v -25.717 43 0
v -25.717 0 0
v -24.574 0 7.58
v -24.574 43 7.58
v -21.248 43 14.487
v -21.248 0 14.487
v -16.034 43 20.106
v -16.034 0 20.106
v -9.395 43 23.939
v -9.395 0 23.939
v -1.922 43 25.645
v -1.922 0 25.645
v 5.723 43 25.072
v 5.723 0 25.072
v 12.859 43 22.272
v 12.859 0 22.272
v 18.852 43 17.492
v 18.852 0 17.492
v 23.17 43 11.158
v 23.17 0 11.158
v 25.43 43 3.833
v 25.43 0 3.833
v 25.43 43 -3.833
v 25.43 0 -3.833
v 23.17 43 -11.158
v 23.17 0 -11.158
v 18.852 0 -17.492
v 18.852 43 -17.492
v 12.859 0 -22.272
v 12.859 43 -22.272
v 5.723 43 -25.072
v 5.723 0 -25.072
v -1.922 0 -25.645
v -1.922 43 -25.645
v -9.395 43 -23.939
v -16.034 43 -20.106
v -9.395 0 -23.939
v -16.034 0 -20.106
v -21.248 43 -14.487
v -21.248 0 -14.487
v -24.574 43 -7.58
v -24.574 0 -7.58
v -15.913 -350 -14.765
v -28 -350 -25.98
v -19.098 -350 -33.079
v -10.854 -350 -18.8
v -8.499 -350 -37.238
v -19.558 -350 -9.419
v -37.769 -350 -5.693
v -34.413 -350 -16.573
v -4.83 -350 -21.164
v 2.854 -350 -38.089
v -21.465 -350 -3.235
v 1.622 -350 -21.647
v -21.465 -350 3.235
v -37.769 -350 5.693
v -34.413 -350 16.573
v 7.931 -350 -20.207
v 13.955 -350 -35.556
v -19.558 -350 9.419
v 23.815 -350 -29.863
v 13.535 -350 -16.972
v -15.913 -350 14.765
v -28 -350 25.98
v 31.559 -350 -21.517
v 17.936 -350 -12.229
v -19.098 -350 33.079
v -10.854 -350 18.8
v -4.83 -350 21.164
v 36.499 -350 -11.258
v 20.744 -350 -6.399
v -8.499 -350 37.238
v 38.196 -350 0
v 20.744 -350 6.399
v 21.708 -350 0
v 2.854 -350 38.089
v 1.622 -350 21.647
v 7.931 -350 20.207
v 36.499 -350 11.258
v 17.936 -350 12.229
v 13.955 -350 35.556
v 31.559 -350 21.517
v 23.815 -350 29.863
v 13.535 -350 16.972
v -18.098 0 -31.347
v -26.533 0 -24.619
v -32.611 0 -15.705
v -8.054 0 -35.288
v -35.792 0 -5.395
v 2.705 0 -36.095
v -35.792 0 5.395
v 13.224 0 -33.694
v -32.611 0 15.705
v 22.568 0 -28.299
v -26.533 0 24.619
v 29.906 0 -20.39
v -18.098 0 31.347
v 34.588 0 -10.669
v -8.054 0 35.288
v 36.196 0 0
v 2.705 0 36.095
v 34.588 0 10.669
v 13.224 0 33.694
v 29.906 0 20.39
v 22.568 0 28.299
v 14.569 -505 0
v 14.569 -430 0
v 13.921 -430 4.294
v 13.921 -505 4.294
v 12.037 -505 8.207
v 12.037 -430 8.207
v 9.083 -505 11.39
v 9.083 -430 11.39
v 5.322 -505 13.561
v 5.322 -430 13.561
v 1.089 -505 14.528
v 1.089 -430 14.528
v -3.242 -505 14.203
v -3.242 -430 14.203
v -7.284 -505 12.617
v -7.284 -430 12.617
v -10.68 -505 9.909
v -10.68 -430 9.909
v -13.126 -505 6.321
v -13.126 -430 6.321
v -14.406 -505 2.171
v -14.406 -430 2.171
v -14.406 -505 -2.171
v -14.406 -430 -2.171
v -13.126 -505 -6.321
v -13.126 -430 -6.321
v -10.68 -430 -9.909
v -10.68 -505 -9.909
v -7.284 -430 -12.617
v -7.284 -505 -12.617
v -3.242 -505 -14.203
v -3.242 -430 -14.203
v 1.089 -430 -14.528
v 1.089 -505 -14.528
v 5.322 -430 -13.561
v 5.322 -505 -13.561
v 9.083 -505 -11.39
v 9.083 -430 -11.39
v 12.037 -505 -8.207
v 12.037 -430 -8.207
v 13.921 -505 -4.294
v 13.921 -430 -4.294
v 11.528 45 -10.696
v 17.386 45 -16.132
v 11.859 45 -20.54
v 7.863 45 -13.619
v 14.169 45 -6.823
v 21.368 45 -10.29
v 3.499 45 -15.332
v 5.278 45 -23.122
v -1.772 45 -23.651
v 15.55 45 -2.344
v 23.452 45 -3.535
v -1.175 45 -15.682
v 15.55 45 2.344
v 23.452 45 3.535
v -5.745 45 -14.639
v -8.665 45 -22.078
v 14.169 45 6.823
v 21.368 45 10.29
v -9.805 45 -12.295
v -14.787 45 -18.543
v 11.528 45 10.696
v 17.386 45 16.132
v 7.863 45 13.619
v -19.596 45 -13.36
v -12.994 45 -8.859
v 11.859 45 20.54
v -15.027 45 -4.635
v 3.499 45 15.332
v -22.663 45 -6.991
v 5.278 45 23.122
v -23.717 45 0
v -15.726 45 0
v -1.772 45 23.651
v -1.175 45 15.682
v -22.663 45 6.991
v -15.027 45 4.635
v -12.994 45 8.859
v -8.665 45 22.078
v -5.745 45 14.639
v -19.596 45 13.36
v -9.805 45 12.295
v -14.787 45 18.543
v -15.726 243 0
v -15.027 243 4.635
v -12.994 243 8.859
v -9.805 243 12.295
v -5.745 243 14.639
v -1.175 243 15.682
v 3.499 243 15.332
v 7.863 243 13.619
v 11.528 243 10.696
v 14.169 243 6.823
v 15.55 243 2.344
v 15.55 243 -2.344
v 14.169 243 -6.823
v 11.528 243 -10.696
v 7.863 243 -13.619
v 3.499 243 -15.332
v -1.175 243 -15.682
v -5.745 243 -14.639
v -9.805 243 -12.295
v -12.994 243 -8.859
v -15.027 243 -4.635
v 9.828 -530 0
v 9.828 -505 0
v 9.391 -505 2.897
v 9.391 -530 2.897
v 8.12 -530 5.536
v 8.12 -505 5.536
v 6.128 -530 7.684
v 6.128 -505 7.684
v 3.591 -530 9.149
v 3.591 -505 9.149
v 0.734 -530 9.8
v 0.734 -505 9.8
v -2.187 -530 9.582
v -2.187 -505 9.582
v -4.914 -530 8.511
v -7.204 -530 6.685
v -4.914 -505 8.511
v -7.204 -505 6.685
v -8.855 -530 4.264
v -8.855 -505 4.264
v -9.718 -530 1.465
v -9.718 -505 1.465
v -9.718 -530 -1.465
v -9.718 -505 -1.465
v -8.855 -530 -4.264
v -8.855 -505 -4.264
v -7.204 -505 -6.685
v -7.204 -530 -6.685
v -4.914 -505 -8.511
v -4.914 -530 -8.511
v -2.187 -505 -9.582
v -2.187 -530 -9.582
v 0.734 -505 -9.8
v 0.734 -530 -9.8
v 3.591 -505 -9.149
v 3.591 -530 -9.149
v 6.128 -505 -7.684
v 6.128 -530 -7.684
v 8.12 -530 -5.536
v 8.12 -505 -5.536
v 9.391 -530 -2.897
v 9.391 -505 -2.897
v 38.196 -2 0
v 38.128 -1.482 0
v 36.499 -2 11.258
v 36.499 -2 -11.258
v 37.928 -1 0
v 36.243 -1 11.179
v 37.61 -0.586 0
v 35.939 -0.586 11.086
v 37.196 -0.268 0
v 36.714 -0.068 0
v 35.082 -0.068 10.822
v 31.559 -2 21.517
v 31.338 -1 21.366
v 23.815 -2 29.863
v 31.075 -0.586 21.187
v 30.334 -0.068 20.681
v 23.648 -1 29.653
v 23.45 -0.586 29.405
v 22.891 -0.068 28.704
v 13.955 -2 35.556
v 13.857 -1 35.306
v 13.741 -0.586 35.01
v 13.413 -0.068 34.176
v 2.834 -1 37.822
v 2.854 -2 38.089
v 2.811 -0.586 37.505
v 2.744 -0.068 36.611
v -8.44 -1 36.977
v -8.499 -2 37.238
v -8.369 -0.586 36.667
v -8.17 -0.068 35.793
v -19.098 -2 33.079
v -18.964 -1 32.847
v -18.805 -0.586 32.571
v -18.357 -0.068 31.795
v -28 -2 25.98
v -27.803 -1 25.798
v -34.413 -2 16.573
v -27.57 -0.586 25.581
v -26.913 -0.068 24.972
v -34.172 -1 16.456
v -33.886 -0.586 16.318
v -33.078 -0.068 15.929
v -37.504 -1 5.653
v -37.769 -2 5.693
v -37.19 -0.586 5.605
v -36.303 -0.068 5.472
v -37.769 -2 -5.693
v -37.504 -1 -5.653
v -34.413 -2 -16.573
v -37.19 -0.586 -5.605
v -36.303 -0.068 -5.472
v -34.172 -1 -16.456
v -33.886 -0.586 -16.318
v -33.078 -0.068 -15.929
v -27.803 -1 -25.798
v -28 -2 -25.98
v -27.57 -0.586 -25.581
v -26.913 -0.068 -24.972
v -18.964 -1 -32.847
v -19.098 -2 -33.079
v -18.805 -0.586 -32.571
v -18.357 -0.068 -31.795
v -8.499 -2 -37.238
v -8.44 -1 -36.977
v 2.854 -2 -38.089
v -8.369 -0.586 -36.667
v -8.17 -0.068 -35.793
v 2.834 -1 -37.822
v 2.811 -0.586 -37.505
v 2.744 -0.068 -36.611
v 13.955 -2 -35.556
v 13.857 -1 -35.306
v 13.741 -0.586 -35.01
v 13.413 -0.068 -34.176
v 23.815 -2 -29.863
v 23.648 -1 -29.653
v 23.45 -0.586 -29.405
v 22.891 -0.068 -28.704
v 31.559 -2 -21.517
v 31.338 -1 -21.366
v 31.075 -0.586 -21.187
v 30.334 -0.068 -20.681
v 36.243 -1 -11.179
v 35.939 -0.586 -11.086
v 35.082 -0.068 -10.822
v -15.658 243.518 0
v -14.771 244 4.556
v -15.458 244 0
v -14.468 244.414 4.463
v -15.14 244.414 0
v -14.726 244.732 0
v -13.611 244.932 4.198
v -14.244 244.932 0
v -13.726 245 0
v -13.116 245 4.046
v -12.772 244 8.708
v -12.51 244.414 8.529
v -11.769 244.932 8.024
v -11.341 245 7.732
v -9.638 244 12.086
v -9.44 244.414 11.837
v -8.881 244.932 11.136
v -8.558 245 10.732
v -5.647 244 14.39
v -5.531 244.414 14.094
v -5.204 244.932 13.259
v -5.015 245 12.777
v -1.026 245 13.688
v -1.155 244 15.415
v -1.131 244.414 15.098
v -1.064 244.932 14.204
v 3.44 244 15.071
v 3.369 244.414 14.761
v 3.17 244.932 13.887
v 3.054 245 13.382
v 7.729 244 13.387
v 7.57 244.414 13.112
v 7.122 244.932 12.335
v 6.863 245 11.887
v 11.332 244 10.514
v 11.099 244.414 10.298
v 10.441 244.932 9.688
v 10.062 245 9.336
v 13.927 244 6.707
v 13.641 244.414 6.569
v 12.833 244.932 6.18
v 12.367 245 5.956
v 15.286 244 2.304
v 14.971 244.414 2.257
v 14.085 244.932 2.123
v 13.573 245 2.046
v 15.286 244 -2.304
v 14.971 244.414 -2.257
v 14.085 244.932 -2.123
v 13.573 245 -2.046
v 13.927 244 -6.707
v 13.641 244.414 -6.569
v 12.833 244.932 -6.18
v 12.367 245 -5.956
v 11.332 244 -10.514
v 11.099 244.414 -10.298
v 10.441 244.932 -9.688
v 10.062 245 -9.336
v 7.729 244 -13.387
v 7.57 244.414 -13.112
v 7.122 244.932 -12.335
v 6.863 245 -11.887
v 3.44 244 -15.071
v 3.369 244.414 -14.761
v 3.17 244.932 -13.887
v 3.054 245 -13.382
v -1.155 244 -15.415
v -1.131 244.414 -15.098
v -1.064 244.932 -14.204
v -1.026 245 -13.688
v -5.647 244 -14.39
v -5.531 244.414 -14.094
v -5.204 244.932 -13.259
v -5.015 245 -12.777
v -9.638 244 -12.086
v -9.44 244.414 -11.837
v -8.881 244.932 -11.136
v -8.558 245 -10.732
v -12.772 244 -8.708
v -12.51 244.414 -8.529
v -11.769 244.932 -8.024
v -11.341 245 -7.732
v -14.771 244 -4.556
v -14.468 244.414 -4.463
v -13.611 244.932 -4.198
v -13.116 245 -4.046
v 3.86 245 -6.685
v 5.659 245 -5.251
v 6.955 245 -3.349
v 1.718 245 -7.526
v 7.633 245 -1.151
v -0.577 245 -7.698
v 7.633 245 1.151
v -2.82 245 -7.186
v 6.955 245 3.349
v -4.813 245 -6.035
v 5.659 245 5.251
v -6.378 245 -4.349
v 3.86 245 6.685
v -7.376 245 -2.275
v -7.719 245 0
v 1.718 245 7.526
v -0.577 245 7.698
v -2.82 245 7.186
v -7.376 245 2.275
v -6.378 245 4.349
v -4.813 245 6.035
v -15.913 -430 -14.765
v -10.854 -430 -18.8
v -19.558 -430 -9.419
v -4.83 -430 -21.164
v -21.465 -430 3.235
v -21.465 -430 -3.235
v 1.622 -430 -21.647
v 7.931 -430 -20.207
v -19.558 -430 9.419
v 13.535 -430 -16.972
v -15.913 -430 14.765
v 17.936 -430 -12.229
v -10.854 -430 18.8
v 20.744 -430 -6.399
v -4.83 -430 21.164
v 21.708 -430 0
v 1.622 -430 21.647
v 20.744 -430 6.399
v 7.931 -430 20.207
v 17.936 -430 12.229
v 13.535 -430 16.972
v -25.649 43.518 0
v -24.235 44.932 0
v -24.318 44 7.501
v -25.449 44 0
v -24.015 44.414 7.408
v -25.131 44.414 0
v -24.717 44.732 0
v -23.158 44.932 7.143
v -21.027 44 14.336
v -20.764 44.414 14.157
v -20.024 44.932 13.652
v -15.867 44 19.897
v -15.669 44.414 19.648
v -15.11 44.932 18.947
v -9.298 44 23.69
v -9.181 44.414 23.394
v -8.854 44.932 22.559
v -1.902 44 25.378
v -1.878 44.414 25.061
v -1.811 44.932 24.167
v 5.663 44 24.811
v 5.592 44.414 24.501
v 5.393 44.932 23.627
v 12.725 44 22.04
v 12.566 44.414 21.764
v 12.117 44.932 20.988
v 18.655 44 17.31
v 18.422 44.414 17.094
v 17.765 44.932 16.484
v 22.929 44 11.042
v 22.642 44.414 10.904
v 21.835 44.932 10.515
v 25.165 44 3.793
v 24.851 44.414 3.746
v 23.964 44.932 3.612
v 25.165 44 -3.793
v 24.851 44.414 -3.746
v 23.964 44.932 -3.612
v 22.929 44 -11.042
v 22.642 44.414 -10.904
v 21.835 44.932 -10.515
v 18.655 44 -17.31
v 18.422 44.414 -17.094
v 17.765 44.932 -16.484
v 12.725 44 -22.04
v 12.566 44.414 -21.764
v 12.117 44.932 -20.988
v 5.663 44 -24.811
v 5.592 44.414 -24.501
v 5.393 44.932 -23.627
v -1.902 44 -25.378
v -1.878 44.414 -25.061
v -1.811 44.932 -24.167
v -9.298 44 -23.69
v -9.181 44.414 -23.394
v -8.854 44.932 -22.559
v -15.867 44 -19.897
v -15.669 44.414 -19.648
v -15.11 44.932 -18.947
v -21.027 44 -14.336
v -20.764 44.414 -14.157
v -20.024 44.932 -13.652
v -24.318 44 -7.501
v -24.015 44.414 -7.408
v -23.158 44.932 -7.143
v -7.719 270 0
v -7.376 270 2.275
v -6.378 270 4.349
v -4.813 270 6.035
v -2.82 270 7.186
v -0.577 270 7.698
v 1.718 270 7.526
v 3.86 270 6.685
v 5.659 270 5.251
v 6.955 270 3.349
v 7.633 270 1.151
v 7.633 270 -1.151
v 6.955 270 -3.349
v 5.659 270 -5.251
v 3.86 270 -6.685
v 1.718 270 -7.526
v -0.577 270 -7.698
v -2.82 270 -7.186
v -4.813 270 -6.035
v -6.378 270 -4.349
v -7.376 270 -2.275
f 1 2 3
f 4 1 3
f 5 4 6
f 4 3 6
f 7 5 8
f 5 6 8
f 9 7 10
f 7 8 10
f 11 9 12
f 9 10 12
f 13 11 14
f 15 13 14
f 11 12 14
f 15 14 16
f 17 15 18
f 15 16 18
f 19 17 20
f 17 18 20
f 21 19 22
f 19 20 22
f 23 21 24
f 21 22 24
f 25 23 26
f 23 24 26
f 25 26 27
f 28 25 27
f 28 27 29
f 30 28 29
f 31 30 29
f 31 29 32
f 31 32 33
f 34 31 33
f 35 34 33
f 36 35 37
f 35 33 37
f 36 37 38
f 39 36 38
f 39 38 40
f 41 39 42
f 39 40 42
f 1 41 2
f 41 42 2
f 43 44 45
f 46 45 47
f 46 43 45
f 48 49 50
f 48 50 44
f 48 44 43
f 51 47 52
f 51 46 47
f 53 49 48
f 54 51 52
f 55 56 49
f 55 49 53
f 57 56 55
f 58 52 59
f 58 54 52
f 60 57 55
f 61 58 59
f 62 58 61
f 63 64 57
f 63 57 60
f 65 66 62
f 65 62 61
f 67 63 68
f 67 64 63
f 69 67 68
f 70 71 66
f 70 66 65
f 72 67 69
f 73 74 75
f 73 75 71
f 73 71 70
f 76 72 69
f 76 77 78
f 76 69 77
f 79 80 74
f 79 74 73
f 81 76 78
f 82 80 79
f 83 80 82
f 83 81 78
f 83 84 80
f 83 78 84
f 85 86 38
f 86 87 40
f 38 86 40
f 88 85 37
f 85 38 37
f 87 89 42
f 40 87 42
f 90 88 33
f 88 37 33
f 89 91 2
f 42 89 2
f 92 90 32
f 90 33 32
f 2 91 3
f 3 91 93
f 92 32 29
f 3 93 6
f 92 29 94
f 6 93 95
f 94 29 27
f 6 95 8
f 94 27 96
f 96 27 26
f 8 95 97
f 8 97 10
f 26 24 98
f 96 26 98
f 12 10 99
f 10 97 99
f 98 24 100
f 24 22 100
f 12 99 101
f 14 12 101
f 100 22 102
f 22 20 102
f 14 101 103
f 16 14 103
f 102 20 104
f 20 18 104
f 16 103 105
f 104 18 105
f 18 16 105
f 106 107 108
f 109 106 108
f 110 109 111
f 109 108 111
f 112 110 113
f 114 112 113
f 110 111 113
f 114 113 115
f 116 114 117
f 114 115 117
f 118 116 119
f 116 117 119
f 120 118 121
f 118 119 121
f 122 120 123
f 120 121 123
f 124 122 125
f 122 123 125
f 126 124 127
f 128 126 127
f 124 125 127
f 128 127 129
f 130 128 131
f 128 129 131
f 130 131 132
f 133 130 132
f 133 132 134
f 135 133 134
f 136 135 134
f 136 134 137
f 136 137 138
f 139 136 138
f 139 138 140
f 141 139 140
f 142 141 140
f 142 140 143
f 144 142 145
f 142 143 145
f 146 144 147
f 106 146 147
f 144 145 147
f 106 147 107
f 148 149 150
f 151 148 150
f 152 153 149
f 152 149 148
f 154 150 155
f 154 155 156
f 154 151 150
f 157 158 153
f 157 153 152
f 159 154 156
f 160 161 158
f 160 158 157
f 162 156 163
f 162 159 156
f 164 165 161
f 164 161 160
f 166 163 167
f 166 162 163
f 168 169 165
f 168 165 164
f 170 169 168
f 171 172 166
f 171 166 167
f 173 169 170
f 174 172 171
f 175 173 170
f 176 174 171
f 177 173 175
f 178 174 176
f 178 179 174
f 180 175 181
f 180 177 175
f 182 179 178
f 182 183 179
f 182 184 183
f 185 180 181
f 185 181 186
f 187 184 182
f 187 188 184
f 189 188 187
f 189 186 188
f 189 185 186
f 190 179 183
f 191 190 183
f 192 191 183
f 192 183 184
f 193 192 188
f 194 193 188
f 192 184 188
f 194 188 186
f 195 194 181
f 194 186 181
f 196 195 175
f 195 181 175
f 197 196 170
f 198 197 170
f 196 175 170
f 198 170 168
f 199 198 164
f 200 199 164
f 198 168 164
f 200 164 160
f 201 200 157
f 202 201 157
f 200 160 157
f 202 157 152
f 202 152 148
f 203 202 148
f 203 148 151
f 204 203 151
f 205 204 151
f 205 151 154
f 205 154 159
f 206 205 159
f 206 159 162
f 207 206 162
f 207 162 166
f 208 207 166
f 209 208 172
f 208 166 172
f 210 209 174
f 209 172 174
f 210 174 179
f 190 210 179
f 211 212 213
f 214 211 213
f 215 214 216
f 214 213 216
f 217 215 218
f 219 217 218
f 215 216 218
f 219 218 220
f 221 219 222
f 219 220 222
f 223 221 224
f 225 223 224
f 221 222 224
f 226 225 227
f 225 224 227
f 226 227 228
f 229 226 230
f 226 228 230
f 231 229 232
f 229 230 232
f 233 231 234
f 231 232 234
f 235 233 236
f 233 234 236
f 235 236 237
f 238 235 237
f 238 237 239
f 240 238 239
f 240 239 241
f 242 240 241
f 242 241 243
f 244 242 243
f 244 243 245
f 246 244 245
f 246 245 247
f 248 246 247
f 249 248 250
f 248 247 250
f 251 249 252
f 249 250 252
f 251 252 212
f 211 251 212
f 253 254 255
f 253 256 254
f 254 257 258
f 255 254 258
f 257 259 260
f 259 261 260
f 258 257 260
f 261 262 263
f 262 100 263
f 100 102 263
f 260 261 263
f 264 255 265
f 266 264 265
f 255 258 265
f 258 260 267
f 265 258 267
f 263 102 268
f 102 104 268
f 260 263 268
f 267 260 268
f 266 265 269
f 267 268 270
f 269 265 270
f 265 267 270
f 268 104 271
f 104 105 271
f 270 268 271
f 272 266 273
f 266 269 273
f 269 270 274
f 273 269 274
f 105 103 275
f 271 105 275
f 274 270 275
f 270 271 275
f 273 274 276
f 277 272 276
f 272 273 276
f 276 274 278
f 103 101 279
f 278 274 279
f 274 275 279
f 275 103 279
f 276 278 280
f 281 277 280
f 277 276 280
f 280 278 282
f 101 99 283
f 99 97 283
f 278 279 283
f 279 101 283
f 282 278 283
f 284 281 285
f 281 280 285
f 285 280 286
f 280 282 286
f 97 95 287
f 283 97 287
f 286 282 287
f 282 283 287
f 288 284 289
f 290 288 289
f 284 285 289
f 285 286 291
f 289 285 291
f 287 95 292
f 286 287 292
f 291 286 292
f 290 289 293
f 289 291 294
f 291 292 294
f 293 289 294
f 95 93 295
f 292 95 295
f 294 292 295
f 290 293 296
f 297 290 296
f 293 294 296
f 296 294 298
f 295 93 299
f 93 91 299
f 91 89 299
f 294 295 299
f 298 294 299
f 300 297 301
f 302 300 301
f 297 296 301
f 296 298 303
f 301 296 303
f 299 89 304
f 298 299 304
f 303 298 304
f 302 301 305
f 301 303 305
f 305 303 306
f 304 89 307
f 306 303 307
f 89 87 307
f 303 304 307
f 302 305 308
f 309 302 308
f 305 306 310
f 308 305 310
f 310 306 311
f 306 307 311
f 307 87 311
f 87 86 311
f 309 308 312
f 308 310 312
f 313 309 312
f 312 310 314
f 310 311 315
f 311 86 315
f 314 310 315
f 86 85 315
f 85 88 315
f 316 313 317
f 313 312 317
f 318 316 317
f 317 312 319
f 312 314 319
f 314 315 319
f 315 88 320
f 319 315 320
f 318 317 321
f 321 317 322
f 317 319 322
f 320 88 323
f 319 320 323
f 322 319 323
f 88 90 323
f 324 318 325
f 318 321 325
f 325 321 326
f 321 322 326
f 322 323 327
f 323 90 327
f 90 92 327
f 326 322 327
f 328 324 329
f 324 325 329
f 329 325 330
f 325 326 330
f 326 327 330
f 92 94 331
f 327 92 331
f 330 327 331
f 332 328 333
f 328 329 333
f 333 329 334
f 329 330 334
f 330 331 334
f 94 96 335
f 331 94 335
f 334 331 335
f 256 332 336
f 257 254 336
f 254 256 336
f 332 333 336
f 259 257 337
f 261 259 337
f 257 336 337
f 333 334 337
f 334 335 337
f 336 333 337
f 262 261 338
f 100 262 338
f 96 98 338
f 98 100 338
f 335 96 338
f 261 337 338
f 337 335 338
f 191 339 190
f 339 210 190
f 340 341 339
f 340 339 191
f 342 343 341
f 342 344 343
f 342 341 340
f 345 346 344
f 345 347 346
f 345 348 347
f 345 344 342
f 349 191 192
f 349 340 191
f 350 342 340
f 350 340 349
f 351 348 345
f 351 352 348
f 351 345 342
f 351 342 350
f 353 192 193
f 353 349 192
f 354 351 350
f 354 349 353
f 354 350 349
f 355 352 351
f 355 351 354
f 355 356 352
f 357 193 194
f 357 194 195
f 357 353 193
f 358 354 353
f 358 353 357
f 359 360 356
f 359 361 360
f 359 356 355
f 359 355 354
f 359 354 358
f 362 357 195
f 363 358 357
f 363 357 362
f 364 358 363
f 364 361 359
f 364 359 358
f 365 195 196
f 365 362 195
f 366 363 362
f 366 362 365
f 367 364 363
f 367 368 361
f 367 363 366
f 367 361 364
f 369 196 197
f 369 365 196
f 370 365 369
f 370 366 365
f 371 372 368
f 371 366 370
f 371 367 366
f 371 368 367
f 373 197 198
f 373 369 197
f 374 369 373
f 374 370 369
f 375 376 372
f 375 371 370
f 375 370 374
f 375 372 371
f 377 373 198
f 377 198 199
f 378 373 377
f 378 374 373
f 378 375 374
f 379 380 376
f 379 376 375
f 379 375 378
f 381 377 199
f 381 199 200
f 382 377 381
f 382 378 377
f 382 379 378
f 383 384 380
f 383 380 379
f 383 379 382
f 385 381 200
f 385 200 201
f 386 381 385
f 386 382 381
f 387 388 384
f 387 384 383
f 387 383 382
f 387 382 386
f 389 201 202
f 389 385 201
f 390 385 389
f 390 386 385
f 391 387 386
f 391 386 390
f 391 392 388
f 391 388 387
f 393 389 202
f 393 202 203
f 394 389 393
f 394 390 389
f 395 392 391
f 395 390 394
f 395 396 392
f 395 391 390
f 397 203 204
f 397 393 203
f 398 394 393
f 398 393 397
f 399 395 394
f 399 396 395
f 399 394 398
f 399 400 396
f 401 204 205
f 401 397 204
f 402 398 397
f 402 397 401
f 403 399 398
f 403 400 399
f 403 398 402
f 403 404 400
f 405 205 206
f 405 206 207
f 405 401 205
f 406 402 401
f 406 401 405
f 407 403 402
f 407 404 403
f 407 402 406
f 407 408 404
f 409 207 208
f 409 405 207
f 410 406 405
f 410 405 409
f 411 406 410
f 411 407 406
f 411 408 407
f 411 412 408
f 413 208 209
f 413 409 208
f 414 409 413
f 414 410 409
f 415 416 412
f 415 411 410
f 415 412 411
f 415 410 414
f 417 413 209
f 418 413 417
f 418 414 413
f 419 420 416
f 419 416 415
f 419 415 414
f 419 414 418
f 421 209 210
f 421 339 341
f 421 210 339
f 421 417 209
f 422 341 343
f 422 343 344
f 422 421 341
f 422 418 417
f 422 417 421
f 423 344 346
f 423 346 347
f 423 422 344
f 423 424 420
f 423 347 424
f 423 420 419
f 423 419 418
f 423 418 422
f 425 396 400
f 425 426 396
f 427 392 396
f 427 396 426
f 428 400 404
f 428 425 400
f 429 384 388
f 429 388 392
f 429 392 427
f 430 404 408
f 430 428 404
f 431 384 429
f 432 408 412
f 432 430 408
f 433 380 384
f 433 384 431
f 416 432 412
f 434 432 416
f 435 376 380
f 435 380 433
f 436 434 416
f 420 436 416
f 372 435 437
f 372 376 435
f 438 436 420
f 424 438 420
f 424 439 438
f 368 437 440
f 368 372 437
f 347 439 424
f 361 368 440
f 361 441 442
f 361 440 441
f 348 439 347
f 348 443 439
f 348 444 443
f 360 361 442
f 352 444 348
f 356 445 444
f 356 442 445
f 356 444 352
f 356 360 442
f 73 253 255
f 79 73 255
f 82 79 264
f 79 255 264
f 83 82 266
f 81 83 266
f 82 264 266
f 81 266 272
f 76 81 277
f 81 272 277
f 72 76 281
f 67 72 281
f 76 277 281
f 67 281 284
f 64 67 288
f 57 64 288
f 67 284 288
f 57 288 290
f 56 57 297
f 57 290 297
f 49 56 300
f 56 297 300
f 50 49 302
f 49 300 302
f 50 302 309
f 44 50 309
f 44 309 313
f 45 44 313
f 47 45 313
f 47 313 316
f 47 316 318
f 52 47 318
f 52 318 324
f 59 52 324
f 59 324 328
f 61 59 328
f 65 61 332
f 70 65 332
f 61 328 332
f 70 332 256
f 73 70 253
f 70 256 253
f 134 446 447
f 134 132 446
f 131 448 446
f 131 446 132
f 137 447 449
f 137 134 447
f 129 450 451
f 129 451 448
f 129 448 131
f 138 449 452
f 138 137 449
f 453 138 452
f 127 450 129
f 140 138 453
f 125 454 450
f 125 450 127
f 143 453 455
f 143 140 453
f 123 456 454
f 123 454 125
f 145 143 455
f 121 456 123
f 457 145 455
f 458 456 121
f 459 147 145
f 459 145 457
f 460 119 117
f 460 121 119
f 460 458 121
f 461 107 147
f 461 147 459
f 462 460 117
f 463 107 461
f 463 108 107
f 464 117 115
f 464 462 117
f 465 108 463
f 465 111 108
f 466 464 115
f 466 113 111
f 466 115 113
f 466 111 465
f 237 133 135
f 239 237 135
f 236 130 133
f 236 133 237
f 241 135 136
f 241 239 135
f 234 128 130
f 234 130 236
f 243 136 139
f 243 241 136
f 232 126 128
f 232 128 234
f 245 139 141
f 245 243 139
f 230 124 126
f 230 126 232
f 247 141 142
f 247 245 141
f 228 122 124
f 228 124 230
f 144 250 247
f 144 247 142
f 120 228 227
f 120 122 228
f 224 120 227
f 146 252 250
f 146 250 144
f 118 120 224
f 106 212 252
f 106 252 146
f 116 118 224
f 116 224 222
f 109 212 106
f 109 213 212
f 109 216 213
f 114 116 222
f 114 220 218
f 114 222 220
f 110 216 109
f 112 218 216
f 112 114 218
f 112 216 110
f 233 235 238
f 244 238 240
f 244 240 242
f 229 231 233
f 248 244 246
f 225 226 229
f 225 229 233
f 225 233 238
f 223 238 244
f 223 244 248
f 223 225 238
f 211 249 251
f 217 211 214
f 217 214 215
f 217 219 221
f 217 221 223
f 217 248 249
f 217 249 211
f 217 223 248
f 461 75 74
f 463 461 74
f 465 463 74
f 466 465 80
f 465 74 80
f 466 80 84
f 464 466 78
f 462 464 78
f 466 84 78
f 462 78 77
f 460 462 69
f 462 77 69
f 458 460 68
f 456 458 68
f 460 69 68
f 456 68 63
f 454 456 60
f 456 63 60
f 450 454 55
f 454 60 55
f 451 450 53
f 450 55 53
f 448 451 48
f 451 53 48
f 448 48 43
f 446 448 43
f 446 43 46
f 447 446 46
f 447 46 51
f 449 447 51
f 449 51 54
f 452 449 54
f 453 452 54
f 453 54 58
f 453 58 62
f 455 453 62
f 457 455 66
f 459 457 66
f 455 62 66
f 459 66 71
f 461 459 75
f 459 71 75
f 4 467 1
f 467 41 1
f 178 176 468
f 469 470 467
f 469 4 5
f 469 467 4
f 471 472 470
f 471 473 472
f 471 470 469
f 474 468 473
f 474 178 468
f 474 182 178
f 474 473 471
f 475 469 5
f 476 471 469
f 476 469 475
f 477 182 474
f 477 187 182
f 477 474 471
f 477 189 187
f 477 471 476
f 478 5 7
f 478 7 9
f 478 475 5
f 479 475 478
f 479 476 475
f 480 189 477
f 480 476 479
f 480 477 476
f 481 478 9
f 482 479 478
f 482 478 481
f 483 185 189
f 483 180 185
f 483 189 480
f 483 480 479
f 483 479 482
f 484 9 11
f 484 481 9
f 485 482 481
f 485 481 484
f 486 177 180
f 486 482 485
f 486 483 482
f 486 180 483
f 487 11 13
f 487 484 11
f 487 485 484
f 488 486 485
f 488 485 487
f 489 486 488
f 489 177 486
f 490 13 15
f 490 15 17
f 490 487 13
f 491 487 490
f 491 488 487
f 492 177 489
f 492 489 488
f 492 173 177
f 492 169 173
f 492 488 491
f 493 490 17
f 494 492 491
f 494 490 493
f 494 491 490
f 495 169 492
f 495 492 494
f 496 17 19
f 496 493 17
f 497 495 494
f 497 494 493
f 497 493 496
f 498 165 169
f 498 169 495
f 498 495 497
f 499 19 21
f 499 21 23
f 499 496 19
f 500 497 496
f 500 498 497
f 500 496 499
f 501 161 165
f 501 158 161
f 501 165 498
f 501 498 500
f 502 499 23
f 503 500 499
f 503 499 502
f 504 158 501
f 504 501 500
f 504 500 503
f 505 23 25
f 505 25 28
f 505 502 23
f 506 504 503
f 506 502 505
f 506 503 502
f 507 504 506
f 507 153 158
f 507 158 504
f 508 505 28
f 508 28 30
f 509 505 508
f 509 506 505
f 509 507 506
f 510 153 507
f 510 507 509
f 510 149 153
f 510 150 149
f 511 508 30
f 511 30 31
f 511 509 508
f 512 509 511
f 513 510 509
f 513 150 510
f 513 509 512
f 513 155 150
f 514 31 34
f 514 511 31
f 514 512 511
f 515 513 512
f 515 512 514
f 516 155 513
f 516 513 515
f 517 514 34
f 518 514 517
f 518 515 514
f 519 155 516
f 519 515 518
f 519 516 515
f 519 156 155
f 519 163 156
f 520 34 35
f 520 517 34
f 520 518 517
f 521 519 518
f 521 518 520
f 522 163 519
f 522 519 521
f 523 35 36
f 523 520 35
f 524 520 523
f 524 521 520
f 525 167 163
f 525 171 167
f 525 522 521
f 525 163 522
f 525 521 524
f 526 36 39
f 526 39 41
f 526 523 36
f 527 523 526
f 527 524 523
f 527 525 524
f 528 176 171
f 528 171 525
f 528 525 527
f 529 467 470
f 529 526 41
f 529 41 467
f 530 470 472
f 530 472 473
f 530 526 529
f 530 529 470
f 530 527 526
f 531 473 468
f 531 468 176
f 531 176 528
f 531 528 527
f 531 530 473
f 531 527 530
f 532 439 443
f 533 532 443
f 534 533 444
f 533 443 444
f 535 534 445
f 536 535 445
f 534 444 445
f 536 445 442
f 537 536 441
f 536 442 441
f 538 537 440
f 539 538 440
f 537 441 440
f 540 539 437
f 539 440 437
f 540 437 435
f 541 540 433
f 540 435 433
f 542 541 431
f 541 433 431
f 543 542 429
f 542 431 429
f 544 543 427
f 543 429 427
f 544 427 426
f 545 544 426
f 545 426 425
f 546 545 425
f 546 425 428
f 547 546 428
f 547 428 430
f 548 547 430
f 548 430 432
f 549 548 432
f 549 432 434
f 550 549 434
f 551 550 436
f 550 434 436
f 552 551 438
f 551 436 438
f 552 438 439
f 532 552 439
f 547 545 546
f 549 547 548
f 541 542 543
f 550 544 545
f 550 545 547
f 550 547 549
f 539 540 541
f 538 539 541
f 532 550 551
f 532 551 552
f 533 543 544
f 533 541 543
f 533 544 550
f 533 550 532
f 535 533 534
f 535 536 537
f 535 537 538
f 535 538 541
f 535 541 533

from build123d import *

# Parameters (mm, degrees)
F0_R      = 38.195919
F1_DEPTH  = 350
F2_R      = 25.71702
F3_DEPTH  = 45
F4_R      = 15.726109
F5_DEPTH  = 200
F6_R      = 2
F7_R      = 7.719414
F8_DEPTH  = 25
F9_R      = 21.707928
F10_DEPTH = 80
F11_R     = 14.568553
F12_DEPTH = 75
F13_R     = 9.827947
F14_DEPTH = 25


with BuildPart() as f1:
    # F0 (on Front) → F1 (new body)
    with BuildSketch(Plane.XZ):
        Circle(F0_R)
    extrude(amount=F1_DEPTH)

    # F2 (on face) → F3 (join)
    with BuildSketch(Plane(origin=(0, 0, 0), x_dir=(-1, 0, 0), z_dir=(0, 1, 0))):
        Circle(F2_R)
    extrude(amount=F3_DEPTH)

    # F4 (on face) → F5 (join)
    with BuildSketch(Plane(origin=(0, 45, 0), x_dir=(-1, 0, 0), z_dir=(0, 1, 0))):
        Circle(F4_R)
    extrude(amount=F5_DEPTH)

    # F6
    f6_edges = [f1.edges().sort_by_distance(p)[0] for p in [
        (15.726109, 245, 0),
        (25.71702, 45, 0),
        (-38.195919, 0, 0),
    ]]
    fillet(f6_edges, radius=F6_R)

    # F7 (on face) → F8 (join)
    with BuildSketch(Plane(origin=(0, 245, 0), x_dir=(-1, 0, 0), z_dir=(0, 1, 0))):
        Circle(F7_R)
    extrude(amount=F8_DEPTH)

    # F9 (on face) → F10 (join)
    with BuildSketch(Plane.XZ.offset(350)):
        Circle(F9_R)
    extrude(amount=F10_DEPTH)

    # F11 (on face) → F12 (join)
    with BuildSketch(Plane.XZ.offset(430)):
        Circle(F11_R)
    extrude(amount=F12_DEPTH)

    # F13 (on face) → F14 (join)
    with BuildSketch(Plane.XZ.offset(505)):
        Circle(F13_R)
    extrude(amount=F14_DEPTH)


solid = f1.part
